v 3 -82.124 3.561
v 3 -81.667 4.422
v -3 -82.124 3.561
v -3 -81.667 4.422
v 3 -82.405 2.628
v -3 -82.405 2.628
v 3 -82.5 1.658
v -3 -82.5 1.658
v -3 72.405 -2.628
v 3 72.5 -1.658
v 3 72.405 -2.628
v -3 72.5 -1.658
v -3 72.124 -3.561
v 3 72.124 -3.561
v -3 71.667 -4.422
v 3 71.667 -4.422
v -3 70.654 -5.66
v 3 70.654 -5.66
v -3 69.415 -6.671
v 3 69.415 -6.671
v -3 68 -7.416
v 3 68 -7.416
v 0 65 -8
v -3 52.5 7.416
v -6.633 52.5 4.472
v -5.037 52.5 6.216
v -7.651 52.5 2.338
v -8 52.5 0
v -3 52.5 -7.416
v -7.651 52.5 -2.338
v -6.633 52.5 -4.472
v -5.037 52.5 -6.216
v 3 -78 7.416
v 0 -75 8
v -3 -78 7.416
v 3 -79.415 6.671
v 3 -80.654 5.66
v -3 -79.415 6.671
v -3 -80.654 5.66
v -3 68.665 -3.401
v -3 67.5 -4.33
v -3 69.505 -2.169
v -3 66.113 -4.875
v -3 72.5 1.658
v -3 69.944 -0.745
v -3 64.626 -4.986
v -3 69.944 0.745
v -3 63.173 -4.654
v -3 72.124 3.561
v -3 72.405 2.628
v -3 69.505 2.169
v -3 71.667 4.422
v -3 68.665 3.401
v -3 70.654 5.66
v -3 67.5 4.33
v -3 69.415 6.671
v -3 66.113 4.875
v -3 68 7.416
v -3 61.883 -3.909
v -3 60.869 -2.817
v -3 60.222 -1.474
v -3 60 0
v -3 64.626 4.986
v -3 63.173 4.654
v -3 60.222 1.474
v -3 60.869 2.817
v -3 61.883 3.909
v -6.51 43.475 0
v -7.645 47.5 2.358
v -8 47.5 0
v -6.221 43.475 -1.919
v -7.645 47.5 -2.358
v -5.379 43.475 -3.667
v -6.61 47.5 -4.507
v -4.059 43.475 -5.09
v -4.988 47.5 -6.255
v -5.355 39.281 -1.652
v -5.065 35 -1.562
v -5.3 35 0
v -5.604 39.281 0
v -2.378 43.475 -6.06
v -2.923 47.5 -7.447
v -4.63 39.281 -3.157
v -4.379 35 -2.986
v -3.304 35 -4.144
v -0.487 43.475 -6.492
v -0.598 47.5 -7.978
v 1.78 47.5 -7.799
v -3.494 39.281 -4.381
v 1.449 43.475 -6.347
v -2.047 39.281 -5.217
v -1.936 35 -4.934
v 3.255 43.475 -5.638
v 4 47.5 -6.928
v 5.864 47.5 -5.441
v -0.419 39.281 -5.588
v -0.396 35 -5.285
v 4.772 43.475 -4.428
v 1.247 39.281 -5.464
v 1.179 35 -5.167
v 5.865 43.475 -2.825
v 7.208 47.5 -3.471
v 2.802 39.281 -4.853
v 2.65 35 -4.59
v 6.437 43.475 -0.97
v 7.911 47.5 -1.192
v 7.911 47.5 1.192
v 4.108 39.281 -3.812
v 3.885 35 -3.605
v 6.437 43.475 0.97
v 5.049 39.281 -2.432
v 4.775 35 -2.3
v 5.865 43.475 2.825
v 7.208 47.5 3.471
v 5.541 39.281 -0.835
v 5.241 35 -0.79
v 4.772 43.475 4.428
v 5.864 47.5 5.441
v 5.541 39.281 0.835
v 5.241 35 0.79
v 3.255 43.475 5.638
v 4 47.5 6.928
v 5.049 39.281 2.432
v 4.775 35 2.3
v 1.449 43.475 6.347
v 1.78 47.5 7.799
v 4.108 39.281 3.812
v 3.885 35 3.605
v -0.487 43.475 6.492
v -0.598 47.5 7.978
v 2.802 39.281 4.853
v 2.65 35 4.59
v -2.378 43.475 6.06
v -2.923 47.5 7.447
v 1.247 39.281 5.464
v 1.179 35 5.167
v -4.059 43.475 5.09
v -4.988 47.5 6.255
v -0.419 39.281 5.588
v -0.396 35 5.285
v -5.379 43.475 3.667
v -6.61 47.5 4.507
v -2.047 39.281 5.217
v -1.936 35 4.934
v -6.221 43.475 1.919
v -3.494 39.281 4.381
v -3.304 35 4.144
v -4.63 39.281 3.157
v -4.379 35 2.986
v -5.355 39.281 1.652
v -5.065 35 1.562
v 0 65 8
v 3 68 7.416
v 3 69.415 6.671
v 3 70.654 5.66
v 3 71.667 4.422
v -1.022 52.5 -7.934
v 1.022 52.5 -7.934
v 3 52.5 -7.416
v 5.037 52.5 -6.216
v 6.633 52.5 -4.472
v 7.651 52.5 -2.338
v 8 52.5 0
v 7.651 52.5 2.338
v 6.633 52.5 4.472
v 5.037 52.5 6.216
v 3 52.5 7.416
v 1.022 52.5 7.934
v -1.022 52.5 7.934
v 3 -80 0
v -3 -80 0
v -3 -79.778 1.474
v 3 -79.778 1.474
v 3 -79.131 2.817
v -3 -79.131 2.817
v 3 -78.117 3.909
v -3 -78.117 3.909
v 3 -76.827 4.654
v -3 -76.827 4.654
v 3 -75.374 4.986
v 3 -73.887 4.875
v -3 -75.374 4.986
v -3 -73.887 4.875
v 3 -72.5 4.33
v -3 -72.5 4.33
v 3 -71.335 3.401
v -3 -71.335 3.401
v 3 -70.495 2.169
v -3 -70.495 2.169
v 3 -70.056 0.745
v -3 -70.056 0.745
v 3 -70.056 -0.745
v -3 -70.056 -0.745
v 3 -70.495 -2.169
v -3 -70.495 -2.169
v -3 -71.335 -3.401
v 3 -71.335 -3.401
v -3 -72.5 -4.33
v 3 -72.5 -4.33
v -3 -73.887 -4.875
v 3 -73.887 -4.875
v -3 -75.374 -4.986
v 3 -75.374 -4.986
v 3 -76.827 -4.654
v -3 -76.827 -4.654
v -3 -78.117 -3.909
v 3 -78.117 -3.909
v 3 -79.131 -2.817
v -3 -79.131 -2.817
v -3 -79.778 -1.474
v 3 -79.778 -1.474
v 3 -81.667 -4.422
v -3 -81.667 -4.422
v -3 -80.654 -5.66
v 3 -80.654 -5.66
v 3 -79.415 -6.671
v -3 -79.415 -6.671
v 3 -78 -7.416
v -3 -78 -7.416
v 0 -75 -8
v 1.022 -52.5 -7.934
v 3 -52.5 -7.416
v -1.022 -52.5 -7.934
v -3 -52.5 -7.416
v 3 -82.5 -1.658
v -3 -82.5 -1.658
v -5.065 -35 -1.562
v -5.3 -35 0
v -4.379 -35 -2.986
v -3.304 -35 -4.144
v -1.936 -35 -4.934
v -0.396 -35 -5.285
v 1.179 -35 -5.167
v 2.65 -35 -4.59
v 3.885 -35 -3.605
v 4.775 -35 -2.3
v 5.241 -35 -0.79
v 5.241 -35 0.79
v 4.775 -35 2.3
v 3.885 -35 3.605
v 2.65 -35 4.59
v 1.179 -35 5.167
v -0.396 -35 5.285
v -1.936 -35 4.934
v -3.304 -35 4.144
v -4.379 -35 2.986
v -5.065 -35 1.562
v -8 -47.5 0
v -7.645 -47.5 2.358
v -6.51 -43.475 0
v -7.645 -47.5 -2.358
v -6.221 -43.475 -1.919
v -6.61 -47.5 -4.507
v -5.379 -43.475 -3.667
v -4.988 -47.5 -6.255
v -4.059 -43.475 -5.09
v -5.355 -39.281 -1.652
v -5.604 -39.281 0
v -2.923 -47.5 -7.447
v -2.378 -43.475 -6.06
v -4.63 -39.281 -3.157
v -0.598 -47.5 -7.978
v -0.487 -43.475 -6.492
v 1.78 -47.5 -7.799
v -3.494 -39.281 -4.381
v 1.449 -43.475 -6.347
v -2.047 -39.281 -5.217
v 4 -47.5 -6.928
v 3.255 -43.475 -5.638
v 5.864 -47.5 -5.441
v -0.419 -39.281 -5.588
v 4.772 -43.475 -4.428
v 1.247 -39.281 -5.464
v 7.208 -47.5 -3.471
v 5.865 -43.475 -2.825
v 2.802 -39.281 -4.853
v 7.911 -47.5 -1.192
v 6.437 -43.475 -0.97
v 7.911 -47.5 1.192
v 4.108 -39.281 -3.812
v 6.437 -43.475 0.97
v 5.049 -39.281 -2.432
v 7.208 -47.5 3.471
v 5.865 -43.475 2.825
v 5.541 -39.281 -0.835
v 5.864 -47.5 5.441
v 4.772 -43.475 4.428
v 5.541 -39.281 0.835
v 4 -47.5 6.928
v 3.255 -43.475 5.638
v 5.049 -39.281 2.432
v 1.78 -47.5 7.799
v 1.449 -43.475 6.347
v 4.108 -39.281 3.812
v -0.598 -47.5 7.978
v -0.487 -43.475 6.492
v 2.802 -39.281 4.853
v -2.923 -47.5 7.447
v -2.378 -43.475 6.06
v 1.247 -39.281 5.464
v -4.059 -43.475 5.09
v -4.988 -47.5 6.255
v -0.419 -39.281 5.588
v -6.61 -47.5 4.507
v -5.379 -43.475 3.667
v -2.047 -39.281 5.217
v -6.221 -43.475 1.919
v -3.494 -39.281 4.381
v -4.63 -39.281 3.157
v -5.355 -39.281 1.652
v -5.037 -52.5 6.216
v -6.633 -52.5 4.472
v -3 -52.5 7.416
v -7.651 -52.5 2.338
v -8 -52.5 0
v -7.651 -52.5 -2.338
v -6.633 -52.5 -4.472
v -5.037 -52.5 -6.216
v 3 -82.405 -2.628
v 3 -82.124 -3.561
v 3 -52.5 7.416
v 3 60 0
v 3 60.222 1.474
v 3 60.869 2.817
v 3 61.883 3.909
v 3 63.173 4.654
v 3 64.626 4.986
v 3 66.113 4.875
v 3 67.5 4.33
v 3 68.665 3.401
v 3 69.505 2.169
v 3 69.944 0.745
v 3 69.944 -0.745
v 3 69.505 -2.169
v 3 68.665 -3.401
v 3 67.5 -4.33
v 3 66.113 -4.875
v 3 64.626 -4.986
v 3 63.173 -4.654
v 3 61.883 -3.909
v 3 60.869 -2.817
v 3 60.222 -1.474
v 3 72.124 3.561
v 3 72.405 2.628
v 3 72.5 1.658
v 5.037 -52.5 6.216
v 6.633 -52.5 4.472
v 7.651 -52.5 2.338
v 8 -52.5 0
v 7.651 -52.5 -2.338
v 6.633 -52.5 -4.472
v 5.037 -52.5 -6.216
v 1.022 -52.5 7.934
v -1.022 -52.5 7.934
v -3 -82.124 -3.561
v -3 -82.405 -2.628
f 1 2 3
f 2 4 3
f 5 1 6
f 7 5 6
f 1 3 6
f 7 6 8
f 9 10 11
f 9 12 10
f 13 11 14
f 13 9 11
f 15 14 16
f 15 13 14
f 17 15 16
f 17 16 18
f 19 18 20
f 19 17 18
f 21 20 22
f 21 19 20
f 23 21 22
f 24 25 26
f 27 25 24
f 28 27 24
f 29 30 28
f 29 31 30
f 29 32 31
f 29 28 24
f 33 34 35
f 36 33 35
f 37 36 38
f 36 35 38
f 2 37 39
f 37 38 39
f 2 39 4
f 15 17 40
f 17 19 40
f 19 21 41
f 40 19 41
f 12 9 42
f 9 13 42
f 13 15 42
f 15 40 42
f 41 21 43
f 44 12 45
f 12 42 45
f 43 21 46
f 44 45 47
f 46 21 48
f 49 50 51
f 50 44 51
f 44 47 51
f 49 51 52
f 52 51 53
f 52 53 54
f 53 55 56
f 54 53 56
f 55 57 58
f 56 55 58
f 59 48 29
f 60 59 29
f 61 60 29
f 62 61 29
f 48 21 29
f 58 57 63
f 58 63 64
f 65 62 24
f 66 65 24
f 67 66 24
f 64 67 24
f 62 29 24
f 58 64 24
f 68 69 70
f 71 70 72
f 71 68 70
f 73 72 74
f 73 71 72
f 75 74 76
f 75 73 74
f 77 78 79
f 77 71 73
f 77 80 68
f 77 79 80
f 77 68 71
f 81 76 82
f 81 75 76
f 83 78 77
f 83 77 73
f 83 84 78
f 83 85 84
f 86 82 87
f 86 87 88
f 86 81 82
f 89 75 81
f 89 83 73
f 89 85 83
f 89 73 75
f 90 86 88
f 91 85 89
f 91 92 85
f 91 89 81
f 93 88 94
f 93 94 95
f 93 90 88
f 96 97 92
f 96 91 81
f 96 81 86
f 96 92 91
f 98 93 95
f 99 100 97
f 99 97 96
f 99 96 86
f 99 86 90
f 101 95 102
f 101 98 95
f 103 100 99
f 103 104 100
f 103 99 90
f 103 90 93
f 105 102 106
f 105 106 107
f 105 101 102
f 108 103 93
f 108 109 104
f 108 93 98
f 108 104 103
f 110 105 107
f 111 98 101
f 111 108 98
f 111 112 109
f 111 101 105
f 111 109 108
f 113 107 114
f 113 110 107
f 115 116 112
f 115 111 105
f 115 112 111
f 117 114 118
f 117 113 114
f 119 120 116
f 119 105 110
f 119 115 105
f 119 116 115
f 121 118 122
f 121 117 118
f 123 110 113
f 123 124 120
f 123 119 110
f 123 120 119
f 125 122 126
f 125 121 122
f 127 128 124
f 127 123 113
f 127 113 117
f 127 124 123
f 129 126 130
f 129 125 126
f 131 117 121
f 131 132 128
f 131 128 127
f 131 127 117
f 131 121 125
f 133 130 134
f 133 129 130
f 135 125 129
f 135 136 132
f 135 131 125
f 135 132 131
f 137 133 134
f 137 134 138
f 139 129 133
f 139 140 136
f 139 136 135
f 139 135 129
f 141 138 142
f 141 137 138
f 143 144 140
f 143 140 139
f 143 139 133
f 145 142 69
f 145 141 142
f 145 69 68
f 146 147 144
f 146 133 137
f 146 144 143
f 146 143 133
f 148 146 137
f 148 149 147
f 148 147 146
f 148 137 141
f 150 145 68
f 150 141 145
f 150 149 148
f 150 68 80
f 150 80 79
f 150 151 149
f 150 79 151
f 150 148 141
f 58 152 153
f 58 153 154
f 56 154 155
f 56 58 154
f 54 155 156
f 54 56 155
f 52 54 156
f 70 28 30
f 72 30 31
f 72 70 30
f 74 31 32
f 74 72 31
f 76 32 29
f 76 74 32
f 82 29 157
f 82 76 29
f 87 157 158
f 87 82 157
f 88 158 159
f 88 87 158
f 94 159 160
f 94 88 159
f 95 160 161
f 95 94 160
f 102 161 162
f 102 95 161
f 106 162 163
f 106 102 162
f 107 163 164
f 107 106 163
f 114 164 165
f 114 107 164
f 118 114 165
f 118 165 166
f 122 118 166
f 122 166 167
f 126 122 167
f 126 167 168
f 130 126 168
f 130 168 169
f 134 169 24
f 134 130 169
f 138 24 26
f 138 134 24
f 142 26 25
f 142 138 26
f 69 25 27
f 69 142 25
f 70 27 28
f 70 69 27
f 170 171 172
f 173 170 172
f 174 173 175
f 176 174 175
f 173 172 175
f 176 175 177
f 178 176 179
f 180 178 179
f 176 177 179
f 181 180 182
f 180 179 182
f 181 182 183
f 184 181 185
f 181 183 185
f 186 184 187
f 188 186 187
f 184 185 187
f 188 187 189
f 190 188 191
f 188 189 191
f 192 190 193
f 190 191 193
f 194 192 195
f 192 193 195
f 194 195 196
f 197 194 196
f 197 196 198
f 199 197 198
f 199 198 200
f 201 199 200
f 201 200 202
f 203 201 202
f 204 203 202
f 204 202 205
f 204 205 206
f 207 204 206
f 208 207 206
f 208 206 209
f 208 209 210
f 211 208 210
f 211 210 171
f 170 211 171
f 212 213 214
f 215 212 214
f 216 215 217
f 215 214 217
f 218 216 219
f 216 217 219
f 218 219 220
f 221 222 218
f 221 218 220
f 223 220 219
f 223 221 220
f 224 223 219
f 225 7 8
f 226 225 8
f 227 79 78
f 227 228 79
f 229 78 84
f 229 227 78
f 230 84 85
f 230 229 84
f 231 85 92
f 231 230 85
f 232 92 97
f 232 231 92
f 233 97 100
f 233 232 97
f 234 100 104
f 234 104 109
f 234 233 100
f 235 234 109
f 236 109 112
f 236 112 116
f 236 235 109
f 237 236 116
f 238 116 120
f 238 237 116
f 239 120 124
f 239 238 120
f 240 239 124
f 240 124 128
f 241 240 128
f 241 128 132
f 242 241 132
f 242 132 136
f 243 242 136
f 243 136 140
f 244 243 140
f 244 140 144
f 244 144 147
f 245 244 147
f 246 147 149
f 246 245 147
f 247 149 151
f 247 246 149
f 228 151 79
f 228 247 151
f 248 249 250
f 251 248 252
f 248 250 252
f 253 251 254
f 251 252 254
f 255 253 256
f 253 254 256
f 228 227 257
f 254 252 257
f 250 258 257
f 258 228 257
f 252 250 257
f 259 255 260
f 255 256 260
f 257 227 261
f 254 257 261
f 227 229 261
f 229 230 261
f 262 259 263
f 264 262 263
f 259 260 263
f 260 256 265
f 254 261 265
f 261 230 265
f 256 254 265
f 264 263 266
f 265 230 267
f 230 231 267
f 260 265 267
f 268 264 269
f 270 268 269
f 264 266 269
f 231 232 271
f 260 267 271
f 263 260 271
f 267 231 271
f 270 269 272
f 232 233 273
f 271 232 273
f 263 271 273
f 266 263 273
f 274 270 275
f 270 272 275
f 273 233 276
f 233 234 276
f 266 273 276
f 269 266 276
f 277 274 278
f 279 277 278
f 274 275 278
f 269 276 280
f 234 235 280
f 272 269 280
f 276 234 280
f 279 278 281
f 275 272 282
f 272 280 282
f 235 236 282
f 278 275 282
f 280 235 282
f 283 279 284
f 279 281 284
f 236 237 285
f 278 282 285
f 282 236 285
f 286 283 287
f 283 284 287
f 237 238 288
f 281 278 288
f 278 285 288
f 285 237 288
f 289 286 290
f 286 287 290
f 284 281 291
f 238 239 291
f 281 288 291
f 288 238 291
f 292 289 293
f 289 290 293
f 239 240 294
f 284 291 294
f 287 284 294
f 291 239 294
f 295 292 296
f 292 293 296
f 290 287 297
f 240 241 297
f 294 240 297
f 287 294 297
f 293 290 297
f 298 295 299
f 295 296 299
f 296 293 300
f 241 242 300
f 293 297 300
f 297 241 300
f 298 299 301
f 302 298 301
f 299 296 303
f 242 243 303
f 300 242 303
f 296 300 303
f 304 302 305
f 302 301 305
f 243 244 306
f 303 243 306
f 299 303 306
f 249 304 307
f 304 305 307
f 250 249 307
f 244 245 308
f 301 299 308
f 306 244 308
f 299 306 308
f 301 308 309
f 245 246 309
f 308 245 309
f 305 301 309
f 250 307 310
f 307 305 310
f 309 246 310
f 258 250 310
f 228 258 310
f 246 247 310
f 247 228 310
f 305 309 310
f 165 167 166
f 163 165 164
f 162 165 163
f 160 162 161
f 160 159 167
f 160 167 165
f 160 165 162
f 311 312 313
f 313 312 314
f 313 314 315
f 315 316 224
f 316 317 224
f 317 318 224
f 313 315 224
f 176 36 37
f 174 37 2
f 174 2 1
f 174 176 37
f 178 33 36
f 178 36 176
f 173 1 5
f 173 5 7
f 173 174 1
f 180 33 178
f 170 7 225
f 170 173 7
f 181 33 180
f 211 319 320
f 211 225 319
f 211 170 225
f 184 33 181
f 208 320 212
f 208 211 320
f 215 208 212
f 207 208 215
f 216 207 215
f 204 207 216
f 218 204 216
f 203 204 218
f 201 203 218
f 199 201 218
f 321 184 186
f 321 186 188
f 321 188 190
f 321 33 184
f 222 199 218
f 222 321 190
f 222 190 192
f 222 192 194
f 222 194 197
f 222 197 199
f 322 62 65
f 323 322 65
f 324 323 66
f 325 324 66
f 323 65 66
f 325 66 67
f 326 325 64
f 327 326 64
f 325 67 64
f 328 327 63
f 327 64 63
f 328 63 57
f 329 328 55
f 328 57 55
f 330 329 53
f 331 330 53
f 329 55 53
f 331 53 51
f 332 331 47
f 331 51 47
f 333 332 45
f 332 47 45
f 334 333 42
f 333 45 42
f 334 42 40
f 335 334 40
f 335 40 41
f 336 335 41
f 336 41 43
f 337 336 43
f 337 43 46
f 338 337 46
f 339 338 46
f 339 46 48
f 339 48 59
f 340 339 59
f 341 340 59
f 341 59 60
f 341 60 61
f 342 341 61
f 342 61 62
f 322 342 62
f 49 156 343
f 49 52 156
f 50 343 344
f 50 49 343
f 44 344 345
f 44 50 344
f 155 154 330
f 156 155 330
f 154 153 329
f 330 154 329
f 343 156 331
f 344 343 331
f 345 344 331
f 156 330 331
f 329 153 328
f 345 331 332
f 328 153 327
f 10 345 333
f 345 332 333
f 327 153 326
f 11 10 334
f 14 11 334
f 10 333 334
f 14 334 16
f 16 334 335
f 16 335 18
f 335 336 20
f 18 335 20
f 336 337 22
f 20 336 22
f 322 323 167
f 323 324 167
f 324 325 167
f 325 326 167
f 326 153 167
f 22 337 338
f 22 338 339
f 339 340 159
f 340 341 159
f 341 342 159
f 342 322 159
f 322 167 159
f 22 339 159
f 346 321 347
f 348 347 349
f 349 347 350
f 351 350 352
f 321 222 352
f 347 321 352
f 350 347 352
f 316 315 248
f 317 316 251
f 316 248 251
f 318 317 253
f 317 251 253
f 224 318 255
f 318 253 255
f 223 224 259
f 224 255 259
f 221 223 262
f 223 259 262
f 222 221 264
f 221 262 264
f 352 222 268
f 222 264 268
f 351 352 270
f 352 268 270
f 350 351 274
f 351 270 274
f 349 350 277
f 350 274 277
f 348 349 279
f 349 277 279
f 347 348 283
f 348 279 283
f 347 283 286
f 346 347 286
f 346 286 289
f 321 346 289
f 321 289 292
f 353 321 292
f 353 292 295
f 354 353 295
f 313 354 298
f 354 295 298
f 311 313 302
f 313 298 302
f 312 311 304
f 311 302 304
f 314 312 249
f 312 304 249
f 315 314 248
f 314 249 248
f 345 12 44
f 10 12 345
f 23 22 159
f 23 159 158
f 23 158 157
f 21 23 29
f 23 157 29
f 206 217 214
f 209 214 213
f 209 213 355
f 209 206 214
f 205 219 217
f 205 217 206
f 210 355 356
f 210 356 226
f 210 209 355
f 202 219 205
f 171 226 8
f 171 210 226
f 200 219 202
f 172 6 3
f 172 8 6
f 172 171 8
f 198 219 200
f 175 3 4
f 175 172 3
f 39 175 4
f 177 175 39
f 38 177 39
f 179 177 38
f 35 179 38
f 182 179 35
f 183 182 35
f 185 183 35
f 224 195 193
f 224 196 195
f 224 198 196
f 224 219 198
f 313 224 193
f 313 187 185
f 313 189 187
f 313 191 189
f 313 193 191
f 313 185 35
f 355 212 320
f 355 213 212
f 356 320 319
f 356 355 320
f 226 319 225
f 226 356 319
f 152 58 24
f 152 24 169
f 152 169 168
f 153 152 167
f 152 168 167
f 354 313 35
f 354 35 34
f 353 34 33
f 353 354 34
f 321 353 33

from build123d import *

# Parameters (mm, degrees)
BOSS_EXTRUDE1_DEPTH     = 20
BOSS_EXTRUDE2_DEPTH     = 30
SKETCH5_R               = 5
CUT_EXTRUDE1_DEPTH      = 6
CUT_EXTRUDE1_DEPTH_BACK = 12
FILLET6_R               = 5


with BuildPart() as part:
    # Sketch1 → Revolve1 (revolve)
    with BuildSketch(Plane.XY, mode=Mode.PRIVATE) as revolve1_sk:
        with BuildLine():
            Line((0, 0), (0, -52.5))
            Line((0, -52.5), (8, -52.5))
            Line((8, -52.5), (8, -47.5))
            ThreePointArc((8, -47.5), (5.982694721, -41.39413794), (5.3, -35))
            Line((5.3, -35), (5.3, 0))
            Line((5.3, 0), (0, 0))
        make_face()
    revolve1 = revolve(revolve1_sk.sketch.rotate(Axis((0, 0, 0), (0, -1, 0)), 180), axis=Axis((0, 0, 0), (0, -1, 0)))  # turned: the seam where the file's is

    # Mirror1: Revolve1 across plane
    add(revolve1.mirror(Plane(origin=(5.3, 0, 0), x_dir=(0, 0, 1), z_dir=(0, -1, 0))))

    # Sketch3 → Boss-Extrude1 (add)
    with BuildSketch(Plane(origin=(0, 52.5, 0), x_dir=(1, 0, 0), z_dir=(0, 1, 0))):
        with BuildLine():
            Line((-3, 7.416198487), (-3, -7.416198487))
            ThreePointArc((-3, -7.416198487), (0, -8), (3, -7.416198487))
            Line((3, -7.416198487), (3, 7.416198487))
            ThreePointArc((3, 7.416198487), (0, 8), (-3, 7.416198487))
        make_face()
    extrude(amount=BOSS_EXTRUDE1_DEPTH)

    # Sketch4 → Boss-Extrude2 (add)
    with BuildSketch(Plane.XZ.offset(52.5)):
        with BuildLine():
            Line((3, 7.416198487), (3, -7.416198487))
            ThreePointArc((3, -7.416198487), (0, -8), (-3, -7.416198487))
            Line((-3, -7.416198487), (-3, 7.416198487))
            ThreePointArc((-3, 7.416198487), (0, 8), (3, 7.416198487))
        make_face()
    extrude(amount=BOSS_EXTRUDE2_DEPTH)

    # Sketch5 → Cut-Extrude1 (cut, two sides)
    with BuildSketch(Plane.ZY.offset(3)) as cut_extrude1_sk:
        with Locations(Location((0, 65, 0), (0, 0, 270))):  # turned: the seam where the file's is
            Circle(SKETCH5_R)
        with Locations(Location((0, -75, 0), (0, 0, 270))):  # turned: the seam where the file's is
            Circle(SKETCH5_R)
        with BuildLine():
            Line((-18.407176047, 86.225483422), (21.713257403, 86.225483422))
            Line((21.713257403, 86.225483422), (21.713257403, 65))
            Line((21.713257403, 65), (8, 65))
            ThreePointArc((8, 65), (0, 73), (-8, 65))
            Line((-8, 65), (-18.407176047, 65))
            Line((-18.407176047, 65), (-18.407176047, 86.225483422))
        make_face()
        with BuildLine():
            Line((21.713257403, -75), (8, -75))
            ThreePointArc((8, -75), (0, -83), (-8, -75))
            Line((-8, -75), (-18.407176047, -75))
            Line((-18.407176047, -75), (-18.407176047, -89.54271926))
            Line((-18.407176047, -89.54271926), (21.713257403, -89.54271926))
            Line((21.713257403, -89.54271926), (21.713257403, -75))
        make_face()
    extrude(amount=CUT_EXTRUDE1_DEPTH, mode=Mode.SUBTRACT)
    extrude(cut_extrude1_sk.sketch, amount=-CUT_EXTRUDE1_DEPTH_BACK, mode=Mode.SUBTRACT)

    # Fillet6
    fillet6_edges = [part.edges().sort_by_distance(p)[0] for p in [
        (0, -82.5, 2.783882181),
        (0, -82.5, -2.783882181),
        (0, 72.5, 2.783882181),
        (0, 72.5, -2.783882181),
    ]]
    fillet(fillet6_edges, radius=FILLET6_R)


solid = part.part
